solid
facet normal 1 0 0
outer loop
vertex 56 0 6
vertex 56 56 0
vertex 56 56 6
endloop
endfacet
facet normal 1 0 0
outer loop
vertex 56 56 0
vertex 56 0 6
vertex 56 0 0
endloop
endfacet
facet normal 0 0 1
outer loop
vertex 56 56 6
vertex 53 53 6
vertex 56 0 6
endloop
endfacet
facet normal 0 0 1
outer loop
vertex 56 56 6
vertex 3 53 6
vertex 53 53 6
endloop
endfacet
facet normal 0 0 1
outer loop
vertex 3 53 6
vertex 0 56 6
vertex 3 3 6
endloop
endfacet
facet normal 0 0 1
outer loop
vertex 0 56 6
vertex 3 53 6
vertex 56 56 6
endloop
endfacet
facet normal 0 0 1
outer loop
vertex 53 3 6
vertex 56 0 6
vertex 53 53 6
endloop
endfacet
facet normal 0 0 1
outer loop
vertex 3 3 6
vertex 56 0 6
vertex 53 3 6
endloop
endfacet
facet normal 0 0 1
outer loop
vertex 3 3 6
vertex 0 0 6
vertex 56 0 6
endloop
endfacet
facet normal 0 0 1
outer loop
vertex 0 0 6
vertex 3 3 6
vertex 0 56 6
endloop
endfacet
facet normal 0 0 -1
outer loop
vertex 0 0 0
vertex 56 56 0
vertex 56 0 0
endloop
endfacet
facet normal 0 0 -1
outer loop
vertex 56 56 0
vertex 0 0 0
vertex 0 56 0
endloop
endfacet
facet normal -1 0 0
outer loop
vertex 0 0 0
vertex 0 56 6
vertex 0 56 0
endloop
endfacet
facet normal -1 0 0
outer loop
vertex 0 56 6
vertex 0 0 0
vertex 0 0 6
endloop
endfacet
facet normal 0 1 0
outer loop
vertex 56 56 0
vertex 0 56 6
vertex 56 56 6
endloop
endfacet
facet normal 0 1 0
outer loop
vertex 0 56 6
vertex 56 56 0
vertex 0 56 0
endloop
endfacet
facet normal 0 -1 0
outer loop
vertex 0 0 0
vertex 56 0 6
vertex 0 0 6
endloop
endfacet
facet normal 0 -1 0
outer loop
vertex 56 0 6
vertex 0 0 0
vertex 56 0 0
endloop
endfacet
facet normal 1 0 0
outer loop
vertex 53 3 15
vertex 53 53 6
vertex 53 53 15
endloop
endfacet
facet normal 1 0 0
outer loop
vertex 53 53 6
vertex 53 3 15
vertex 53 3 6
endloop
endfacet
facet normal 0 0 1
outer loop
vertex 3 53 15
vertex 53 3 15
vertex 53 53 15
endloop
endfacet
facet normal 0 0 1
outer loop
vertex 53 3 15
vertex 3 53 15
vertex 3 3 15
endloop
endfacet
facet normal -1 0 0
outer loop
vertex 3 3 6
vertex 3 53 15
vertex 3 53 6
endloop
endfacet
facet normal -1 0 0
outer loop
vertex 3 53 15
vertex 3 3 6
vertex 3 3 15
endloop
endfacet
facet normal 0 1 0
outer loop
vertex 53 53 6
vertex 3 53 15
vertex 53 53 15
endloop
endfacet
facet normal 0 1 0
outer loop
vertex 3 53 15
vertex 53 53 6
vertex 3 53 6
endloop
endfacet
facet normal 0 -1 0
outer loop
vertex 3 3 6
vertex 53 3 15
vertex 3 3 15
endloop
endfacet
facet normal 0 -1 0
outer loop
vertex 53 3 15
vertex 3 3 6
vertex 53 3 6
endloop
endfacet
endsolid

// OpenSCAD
wallthickness = 3;

sizex = 50 + (wallthickness*2);
sizey = 50 + (wallthickness*2);

union() {
    cube([
        sizex,
        sizey,
        wallthickness*2
    ]);
    translate([wallthickness,wallthickness,wallthickness*2]) {
        cube([
            sizex-(wallthickness*2),
            sizey-(wallthickness*2),
            wallthickness*3
        ]);
    };
}
